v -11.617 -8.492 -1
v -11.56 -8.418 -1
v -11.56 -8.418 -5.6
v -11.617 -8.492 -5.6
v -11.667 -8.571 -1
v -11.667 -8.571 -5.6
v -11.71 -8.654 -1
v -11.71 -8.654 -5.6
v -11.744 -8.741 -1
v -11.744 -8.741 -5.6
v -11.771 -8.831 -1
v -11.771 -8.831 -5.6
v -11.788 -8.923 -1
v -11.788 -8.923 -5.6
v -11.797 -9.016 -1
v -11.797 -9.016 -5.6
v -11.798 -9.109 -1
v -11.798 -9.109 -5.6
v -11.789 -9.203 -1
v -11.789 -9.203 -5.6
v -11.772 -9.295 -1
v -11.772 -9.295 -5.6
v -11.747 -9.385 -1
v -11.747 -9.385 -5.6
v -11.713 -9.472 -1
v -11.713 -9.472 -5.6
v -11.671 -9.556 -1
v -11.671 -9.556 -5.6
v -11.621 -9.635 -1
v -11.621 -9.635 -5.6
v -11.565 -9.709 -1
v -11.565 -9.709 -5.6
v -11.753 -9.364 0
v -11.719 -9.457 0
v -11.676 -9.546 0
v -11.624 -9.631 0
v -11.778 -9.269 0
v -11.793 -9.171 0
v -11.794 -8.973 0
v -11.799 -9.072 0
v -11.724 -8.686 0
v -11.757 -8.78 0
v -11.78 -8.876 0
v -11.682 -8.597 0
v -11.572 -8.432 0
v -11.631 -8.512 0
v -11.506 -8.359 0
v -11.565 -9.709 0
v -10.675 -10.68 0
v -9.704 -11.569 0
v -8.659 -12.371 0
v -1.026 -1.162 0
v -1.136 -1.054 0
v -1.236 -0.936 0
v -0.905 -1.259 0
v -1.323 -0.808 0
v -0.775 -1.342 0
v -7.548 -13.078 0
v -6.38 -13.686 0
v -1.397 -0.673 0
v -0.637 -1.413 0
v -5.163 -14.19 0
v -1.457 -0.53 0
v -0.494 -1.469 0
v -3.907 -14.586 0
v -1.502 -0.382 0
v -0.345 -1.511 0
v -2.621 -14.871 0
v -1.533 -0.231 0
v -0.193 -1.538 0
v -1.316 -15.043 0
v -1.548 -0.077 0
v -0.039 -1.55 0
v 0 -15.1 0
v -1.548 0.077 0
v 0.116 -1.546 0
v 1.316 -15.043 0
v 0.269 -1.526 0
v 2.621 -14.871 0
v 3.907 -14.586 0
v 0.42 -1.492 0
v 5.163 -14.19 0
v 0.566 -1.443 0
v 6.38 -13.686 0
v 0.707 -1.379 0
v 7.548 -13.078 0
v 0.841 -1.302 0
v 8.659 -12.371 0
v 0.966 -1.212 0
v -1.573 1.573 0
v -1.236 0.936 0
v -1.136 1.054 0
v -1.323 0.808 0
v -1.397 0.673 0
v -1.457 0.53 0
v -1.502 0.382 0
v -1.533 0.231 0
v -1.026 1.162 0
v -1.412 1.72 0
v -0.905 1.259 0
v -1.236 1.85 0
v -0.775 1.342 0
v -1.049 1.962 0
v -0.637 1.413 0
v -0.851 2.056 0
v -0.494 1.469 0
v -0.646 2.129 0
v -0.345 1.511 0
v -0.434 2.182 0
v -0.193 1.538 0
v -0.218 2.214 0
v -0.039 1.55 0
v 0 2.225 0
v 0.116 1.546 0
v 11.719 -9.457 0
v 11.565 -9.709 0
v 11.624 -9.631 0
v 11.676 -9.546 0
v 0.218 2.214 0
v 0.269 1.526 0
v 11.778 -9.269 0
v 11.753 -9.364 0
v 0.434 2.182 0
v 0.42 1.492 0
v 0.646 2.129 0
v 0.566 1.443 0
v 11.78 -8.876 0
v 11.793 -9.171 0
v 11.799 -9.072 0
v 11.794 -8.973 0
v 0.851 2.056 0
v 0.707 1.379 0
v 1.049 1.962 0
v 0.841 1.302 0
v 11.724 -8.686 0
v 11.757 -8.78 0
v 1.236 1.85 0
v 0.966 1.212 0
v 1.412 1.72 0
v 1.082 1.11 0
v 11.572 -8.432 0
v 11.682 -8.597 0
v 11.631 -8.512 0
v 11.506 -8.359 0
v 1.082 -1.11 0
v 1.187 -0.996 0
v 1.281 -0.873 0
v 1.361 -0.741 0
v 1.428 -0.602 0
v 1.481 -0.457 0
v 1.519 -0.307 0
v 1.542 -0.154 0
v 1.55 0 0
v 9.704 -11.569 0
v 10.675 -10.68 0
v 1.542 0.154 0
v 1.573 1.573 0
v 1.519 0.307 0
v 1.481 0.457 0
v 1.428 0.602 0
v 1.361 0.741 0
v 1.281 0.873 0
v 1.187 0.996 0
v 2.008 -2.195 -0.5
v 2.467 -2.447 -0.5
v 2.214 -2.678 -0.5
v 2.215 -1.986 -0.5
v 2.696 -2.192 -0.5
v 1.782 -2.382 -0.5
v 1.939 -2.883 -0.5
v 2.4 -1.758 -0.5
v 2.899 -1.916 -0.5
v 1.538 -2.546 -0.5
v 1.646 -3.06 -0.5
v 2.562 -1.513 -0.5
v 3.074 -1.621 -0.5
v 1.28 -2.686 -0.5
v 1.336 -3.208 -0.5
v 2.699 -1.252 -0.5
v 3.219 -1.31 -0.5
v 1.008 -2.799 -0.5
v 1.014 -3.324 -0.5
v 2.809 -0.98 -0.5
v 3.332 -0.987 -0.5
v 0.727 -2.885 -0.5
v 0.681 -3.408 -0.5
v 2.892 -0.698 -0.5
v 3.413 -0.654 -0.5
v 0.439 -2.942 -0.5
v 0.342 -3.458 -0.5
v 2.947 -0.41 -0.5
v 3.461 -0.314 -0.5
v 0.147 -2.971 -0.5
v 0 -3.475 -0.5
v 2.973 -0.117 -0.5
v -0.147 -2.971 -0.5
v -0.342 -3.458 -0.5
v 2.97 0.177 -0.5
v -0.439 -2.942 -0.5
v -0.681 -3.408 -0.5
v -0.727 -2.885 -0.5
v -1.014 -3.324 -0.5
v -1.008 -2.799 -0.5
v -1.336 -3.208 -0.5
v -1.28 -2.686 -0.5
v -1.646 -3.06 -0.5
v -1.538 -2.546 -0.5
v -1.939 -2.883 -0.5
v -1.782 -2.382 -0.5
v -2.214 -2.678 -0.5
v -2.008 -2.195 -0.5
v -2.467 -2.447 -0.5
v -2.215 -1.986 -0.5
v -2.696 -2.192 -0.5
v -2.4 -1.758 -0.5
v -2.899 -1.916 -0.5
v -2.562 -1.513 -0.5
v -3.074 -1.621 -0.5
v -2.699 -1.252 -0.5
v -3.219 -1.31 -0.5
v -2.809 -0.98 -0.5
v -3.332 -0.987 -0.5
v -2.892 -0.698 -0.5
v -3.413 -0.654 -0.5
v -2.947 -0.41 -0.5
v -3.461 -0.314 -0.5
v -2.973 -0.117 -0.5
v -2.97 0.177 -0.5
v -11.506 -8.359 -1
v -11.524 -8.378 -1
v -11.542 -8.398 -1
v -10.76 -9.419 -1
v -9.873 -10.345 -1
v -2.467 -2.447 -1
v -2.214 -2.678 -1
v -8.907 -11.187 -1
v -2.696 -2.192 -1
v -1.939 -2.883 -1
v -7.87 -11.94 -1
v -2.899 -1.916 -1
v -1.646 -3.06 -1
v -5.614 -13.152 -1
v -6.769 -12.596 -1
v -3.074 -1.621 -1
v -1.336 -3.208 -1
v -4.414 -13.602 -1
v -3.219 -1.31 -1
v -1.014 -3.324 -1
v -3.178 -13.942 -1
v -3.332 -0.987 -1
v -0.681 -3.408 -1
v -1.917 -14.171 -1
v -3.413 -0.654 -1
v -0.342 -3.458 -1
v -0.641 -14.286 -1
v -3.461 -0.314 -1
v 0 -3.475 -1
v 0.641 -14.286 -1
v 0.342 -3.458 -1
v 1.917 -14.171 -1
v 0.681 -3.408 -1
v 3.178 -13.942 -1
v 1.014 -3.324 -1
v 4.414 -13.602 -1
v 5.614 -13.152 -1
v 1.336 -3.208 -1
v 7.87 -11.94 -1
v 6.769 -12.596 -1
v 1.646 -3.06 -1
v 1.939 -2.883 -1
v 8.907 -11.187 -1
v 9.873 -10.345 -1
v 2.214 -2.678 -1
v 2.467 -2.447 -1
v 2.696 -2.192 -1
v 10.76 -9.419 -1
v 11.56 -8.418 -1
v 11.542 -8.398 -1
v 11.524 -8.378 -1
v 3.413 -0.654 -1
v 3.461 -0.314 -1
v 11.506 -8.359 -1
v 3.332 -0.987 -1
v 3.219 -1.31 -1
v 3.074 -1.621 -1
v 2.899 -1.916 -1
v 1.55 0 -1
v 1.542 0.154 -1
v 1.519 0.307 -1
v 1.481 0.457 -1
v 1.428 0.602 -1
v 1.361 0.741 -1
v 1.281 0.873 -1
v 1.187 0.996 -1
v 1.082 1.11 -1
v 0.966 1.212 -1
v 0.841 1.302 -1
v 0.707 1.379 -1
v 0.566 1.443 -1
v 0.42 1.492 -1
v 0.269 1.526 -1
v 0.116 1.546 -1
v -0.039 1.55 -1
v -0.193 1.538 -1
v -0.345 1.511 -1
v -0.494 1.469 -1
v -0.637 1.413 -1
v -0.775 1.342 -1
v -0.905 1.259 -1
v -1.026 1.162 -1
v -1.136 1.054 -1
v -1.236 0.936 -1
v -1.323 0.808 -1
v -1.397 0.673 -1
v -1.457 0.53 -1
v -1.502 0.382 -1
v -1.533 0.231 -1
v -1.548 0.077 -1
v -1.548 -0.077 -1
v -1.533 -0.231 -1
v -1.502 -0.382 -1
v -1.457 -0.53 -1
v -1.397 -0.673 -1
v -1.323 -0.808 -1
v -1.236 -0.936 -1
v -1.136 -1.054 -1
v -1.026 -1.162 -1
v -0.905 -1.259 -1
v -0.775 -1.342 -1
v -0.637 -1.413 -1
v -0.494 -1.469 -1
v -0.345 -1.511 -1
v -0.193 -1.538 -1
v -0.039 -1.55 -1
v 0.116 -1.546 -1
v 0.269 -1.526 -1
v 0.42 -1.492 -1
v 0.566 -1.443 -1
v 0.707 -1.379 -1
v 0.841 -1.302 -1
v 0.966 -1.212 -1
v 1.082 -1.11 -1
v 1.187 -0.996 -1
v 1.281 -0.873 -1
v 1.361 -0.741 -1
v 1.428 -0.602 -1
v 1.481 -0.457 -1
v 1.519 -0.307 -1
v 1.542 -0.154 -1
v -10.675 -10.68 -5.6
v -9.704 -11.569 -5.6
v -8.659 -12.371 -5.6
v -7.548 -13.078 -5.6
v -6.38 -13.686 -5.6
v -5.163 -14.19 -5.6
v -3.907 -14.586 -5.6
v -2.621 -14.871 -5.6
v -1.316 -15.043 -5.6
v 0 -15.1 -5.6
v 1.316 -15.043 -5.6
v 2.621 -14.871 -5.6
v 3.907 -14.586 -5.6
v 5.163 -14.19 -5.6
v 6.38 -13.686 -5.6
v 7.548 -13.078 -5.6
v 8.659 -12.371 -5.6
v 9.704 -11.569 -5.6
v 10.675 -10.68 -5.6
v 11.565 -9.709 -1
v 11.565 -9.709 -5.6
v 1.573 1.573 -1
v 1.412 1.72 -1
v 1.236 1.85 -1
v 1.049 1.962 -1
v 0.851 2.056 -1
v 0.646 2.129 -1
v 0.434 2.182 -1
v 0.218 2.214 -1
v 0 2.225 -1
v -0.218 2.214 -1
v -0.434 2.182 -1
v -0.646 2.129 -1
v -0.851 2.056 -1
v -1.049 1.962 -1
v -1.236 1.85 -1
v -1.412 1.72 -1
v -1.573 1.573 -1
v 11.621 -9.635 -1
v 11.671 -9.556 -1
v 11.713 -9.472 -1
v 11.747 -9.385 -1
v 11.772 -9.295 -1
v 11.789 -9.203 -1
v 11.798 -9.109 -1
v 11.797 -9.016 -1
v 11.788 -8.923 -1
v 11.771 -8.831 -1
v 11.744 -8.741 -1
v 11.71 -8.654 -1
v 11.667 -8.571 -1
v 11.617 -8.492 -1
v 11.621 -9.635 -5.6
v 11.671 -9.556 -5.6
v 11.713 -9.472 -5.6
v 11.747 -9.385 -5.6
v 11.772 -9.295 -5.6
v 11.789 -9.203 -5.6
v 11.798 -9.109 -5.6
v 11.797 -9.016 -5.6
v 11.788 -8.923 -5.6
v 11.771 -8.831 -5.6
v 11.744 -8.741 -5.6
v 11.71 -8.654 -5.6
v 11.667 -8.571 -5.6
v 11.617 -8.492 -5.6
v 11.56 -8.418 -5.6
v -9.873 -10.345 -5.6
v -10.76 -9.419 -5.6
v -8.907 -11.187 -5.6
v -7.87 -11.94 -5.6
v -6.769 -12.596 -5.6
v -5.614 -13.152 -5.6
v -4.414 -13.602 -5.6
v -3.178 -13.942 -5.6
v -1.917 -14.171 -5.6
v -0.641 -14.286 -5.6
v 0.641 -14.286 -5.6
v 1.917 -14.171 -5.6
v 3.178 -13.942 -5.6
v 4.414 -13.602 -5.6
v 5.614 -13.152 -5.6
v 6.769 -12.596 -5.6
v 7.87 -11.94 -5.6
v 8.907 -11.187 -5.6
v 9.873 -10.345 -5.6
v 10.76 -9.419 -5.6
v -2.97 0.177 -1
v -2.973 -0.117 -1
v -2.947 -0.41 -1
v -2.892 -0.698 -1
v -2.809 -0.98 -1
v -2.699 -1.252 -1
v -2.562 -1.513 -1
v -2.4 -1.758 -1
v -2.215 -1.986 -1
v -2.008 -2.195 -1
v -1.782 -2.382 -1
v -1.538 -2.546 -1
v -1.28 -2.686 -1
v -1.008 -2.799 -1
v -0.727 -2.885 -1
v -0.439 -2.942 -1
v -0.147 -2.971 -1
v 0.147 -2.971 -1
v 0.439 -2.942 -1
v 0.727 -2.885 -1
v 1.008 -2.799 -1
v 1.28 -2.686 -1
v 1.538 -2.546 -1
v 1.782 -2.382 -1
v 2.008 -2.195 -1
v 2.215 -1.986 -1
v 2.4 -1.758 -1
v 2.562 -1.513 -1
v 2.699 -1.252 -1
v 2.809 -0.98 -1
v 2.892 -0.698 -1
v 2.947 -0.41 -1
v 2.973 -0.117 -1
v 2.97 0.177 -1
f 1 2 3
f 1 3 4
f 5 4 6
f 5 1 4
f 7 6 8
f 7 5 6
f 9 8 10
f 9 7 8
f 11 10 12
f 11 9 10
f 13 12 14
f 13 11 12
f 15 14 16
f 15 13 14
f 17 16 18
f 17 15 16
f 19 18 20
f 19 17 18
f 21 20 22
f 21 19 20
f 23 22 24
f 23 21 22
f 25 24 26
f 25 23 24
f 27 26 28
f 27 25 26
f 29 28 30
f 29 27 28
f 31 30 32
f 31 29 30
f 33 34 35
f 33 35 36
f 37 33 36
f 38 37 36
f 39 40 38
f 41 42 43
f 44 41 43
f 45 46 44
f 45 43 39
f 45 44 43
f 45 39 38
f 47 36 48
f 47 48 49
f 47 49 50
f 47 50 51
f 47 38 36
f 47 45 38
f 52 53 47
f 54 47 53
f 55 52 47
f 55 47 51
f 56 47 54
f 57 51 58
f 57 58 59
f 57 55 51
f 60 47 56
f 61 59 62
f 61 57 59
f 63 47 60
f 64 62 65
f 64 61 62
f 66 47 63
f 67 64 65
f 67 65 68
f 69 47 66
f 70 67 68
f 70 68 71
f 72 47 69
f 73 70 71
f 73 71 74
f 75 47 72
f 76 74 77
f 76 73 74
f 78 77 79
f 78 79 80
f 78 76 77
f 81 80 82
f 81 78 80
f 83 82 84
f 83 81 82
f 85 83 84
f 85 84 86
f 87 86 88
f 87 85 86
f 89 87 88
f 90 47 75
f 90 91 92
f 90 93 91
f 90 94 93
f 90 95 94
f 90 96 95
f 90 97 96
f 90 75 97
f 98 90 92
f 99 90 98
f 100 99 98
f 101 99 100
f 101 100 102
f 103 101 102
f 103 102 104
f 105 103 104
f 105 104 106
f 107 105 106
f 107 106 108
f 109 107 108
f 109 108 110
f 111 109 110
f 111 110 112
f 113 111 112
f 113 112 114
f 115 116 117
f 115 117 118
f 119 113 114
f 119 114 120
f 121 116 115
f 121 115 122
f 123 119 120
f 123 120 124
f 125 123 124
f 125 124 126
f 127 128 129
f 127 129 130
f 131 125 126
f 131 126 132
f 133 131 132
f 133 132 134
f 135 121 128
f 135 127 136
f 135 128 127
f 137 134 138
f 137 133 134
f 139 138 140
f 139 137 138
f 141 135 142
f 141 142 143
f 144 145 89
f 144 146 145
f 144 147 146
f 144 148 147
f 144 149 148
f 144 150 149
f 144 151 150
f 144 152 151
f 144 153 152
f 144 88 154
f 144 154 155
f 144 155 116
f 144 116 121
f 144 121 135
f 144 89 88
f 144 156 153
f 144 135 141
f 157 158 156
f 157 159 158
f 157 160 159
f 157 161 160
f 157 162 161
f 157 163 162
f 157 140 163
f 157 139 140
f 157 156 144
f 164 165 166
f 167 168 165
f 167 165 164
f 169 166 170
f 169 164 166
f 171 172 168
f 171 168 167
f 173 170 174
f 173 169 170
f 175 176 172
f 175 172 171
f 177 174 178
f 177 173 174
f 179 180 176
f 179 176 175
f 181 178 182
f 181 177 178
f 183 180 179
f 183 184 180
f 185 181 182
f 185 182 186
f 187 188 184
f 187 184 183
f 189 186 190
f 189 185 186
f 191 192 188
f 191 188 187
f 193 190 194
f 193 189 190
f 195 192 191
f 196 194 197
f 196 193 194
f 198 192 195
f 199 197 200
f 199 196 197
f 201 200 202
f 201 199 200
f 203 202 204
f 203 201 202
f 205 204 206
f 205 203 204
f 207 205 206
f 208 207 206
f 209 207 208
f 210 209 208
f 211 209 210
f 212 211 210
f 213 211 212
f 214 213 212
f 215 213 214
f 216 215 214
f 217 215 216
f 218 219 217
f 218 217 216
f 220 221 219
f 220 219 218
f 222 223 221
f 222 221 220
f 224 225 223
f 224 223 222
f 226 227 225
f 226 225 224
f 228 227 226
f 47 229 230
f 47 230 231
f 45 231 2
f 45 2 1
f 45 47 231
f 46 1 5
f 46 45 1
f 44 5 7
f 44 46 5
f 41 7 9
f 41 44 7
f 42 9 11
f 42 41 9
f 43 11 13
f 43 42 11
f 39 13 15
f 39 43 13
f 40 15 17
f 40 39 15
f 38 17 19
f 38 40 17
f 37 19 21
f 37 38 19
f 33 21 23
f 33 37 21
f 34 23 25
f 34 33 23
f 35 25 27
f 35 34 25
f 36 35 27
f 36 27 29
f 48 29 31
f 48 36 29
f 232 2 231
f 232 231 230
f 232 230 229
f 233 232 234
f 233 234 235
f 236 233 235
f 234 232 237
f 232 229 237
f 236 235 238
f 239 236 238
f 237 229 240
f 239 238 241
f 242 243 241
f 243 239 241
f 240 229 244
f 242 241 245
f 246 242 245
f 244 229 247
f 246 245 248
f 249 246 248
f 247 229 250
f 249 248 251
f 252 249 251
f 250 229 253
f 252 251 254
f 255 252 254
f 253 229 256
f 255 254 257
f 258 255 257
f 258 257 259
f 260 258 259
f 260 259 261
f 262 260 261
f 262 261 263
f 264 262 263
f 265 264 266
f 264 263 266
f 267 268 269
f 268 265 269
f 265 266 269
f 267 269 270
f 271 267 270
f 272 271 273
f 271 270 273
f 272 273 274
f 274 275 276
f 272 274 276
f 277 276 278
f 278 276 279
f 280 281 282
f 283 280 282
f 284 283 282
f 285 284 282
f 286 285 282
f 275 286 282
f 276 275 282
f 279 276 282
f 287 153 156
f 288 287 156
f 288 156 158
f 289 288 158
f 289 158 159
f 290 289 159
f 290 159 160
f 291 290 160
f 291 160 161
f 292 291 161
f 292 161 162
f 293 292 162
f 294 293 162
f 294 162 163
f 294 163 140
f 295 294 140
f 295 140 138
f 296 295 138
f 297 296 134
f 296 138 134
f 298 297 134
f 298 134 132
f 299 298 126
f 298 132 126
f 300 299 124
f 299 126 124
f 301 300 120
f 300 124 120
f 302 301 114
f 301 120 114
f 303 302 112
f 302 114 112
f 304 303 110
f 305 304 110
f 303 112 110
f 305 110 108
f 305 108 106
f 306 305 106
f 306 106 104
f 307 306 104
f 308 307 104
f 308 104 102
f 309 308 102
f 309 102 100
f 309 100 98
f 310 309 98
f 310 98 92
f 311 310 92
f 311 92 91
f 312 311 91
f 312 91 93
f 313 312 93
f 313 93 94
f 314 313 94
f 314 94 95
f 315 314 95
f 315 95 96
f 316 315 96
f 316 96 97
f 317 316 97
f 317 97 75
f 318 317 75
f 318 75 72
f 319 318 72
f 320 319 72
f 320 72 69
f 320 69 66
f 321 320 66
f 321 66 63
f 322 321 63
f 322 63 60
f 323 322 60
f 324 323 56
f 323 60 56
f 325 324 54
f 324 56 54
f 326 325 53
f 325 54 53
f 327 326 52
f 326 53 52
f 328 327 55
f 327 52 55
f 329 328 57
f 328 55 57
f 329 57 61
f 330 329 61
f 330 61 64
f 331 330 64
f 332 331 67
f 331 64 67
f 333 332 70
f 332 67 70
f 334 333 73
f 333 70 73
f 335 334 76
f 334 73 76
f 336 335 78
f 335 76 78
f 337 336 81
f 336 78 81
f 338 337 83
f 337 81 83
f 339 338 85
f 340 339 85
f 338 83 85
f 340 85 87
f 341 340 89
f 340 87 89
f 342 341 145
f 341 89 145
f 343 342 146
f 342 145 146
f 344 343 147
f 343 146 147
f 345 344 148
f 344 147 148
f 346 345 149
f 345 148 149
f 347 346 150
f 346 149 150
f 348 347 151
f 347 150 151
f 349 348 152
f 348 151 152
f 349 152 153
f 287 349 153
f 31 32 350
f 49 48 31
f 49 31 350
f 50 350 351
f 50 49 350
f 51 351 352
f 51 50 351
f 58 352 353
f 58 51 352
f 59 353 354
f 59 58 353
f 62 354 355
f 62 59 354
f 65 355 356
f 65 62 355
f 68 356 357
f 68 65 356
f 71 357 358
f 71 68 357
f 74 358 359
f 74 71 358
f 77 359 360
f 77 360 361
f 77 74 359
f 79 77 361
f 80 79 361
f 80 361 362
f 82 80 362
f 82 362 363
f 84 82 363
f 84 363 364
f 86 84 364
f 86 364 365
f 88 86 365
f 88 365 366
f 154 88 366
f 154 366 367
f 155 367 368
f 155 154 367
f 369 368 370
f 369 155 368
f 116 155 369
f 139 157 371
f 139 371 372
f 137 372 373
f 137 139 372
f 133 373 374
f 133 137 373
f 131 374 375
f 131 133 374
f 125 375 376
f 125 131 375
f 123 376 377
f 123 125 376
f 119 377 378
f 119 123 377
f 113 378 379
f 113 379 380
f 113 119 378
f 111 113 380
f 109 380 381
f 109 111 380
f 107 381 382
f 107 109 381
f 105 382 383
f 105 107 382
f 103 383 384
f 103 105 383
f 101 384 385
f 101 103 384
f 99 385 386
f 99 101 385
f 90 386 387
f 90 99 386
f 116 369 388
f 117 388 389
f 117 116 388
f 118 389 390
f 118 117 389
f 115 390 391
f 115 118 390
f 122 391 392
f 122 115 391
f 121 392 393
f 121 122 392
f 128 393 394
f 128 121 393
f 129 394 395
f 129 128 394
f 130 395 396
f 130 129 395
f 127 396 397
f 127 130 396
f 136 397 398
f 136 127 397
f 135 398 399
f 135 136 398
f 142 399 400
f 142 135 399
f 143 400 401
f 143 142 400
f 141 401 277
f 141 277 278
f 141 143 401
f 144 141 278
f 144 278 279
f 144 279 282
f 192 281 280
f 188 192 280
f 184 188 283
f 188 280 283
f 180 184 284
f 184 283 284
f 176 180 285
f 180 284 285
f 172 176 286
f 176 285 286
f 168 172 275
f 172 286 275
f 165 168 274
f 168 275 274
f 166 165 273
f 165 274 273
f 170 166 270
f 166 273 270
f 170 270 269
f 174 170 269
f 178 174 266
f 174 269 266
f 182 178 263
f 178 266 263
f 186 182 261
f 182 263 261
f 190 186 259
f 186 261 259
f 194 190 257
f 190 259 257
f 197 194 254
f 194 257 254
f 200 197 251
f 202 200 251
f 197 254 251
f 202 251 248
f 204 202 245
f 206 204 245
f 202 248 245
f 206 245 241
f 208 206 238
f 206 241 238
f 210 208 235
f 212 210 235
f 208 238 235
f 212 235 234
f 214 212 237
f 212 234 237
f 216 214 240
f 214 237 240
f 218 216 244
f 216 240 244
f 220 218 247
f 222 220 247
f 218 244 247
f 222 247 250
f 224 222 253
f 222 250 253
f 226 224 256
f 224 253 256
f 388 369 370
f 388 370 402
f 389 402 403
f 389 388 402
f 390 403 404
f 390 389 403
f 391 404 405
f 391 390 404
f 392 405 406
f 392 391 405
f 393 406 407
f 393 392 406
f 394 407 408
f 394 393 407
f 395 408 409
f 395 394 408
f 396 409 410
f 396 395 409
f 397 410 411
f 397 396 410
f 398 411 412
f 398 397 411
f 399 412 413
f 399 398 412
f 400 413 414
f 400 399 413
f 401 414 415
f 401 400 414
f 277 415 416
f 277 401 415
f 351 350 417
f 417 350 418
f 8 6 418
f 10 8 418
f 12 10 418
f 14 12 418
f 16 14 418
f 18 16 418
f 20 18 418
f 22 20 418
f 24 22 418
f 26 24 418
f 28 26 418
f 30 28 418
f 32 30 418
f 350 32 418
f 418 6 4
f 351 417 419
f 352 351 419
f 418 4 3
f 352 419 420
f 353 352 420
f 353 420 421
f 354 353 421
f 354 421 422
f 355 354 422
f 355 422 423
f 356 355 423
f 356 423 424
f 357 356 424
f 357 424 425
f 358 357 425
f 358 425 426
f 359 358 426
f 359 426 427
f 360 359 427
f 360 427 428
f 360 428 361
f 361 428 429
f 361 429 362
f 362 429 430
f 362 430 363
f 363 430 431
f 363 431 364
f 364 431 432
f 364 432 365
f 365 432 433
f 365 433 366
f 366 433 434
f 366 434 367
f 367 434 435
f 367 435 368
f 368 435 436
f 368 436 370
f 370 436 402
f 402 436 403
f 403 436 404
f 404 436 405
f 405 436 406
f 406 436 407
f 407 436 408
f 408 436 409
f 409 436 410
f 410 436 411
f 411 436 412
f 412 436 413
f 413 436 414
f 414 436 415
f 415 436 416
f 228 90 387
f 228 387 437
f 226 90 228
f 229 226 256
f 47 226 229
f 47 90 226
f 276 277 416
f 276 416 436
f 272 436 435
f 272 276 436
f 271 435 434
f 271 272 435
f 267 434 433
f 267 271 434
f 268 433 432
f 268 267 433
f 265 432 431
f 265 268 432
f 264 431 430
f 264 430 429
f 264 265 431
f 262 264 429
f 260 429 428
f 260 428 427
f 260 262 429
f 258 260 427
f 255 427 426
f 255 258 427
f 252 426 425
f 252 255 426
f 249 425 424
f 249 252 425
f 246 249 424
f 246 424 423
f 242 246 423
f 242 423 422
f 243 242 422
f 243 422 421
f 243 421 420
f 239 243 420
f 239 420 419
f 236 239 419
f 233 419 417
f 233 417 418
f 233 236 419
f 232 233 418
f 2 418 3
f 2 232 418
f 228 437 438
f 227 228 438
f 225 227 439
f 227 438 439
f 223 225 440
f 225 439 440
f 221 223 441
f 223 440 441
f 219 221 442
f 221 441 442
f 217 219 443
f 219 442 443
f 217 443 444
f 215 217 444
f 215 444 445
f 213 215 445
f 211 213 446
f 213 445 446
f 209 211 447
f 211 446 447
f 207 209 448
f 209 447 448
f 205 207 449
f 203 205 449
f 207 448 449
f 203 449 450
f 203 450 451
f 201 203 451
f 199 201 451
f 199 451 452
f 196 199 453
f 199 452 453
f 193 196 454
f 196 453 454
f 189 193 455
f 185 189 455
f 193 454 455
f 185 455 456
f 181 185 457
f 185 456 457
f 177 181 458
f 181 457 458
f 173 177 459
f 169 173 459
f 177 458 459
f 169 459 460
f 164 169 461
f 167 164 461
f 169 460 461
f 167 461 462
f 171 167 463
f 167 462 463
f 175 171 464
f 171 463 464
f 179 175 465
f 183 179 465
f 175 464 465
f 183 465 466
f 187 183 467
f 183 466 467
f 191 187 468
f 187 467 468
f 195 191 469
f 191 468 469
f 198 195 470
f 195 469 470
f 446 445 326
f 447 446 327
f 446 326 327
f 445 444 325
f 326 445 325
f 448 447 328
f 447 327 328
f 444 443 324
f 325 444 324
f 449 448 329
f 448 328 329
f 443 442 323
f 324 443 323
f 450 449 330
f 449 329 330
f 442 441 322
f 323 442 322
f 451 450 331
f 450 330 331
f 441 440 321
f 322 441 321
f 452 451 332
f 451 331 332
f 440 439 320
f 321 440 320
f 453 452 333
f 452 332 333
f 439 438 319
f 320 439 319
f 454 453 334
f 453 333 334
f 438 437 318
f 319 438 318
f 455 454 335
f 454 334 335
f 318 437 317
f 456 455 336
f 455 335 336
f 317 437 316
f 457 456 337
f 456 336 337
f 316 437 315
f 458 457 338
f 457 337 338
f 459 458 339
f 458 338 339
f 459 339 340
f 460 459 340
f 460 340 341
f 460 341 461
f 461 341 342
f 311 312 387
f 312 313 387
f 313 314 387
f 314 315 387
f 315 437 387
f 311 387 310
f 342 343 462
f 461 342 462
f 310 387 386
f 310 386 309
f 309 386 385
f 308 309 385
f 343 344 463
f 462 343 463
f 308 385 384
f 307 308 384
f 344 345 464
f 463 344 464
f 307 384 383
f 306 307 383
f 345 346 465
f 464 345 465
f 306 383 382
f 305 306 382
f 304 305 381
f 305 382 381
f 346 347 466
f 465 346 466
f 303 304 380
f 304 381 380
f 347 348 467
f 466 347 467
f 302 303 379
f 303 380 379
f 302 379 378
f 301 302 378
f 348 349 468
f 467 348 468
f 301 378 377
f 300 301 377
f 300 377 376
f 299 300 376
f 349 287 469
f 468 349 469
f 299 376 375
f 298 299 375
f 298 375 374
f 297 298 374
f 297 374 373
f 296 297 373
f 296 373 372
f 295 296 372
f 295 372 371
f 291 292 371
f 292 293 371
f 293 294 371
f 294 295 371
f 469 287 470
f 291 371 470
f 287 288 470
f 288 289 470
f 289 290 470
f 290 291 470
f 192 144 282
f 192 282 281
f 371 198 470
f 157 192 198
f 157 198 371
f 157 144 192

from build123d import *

# Parameters (mm, degrees)
CROQUIS1_R              = 1.55
SALIENTE_EXTRUIR1_DEPTH = 1
CROQUIS3_R              = 1.55
CORTAR_EXTRUIR1_DEPTH   = 0.5
SALIENTE_EXTRUIR2_DEPTH = 4.6


with BuildPart() as part:
    # Croquis1 → Saliente-Extruir1 (new body)
    with BuildSketch(Plane.XY):
        with BuildLine():
            Line((-1.573312588, 1.573312588), (-11.505819195, -8.359194019))
            ThreePointArc((-11.505819195, -8.359194019), (-11.797766675, -9.022819962), (-11.564578543, -9.709300857))
            ThreePointArc((-11.564578543, -9.709300857), (0, -15.1), (11.564578543, -9.709300857))
            ThreePointArc((11.564578543, -9.709300857), (11.797766675, -9.022819962), (11.505819195, -8.359194019))
            Line((11.505819195, -8.359194019), (1.573312588, 1.573312588))
            ThreePointArc((1.573312588, 1.573312588), (0, 2.225), (-1.573312588, 1.573312588))
        make_face()
        Circle(CROQUIS1_R, mode=Mode.SUBTRACT)
    extrude(amount=-SALIENTE_EXTRUIR1_DEPTH)

    # Croquis3 → Cortar-Extruir1 (cut)
    with BuildSketch(Plane(origin=(0, 0, -1), x_dir=(-1, 0, 0), z_dir=(0, 0, -1))):
        Circle(CROQUIS3_R)
        with BuildLine():
            Line((-2.969736593, 0.176888584), (-3.460771197, -0.314146021))
            ThreePointArc((-3.460771197, -0.314146021), (0, -3.475), (3.460771197, -0.314146021))
            Line((3.460771197, -0.314146021), (2.969736593, 0.176888584))
            ThreePointArc((2.969736593, 0.176888584), (0, -2.975), (-2.969736593, 0.176888584))
        make_face()
    extrude(amount=-CORTAR_EXTRUIR1_DEPTH, mode=Mode.SUBTRACT)

    # Croquis4 → Saliente-Extruir2 (add)
    with BuildSketch(Plane(origin=(0, 0, -1), x_dir=(-1, 0, 0), z_dir=(0, 0, -1))):
        with BuildLine():
            ThreePointArc((-11.559897122, -8.41776565), (0, -14.3), (11.559897122, -8.41776565))
            ThreePointArc((11.559897122, -8.41776565), (11.798705845, -9.062676129), (11.564578543, -9.709300857))
            ThreePointArc((11.564578543, -9.709300857), (0, -15.1), (-11.564578543, -9.709300857))
            ThreePointArc((-11.564578543, -9.709300857), (-11.798705845, -9.062676129), (-11.559897122, -8.41776565))
        make_face()
    extrude(amount=SALIENTE_EXTRUIR2_DEPTH)


solid = part.part
